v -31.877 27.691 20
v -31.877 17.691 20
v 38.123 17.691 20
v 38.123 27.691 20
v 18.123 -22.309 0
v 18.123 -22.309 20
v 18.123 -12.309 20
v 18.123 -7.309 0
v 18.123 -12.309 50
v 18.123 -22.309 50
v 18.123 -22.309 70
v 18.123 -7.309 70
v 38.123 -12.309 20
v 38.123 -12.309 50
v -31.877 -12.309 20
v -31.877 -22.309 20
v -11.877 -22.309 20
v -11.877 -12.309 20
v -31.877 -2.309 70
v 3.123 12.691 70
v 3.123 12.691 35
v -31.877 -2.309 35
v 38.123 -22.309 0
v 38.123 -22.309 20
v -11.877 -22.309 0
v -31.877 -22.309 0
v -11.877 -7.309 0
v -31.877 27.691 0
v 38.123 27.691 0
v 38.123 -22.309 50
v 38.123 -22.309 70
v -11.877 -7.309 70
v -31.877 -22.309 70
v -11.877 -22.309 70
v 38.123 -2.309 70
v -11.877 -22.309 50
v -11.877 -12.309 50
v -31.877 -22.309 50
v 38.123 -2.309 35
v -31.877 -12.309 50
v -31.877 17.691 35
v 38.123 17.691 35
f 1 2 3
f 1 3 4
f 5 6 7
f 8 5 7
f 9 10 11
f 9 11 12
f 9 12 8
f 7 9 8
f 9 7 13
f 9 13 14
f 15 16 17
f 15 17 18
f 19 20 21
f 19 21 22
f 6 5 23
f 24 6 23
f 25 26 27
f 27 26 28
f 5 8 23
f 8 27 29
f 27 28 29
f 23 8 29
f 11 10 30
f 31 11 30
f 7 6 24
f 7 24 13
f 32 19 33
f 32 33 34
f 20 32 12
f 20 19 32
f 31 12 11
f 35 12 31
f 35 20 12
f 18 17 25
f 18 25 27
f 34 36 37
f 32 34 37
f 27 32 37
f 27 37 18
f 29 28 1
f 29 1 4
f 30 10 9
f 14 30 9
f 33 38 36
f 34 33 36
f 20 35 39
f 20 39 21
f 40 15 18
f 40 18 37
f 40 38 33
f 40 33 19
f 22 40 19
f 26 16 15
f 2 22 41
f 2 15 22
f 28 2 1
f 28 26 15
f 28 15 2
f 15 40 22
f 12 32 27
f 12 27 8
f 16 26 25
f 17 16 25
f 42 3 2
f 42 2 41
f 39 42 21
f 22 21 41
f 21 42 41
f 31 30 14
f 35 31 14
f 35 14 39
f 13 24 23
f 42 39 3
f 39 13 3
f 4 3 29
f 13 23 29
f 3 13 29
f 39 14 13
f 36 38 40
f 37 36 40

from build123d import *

# Parameters (mm, degrees)
IZIM1_W                     = 70
IZIM1_H                     = 50
Y_KSEKLIK_EKSTR_ZYON2_DEPTH = 70
IZIM2_W                     = 30
IZIM2_H                     = 10
KES_EKSTR_ZYON1_DEPTH       = 70
IZIM7_W                     = 30
IZIM7_H                     = 15
KES_EKSTR_ZYON3_DEPTH       = 70
KES_EKSTR_ZYON4_DEPTH       = 35
IZIM9_W                     = 15
IZIM9_H                     = 10
KES_EKSTR_ZYON5_DEPTH       = 70


with BuildPart() as part:
    # Çizim1 → Yükseklik-Ekstrüzyon2 (new body)
    with BuildSketch(Plane.XY):
        with Locations((3.122705421, 2.690839695)):
            Rectangle(IZIM1_W, IZIM1_H)
    extrude(amount=Y_KSEKLIK_EKSTR_ZYON2_DEPTH)

    # Çizim2 → Kes-Ekstrüzyon1 (cut)
    with BuildSketch(Plane.ZY.offset(31.877294579)):
        with Locations((35, -17.309160305)):
            Rectangle(IZIM2_W, IZIM2_H)
    extrude(amount=-KES_EKSTR_ZYON1_DEPTH, mode=Mode.SUBTRACT)

    # Çizim7 → Kes-Ekstrüzyon3 (cut)
    with BuildSketch(Plane.XY.offset(70)):
        with Locations((3.122705421, -14.809160305)):
            Rectangle(IZIM7_W, IZIM7_H)
    extrude(amount=-KES_EKSTR_ZYON3_DEPTH, mode=Mode.SUBTRACT)

    # Çizim8 → Kes-Ekstrüzyon4 (cut)
    with BuildSketch(Plane.XY.offset(70)):
        Polygon((38.122705421, -2.309160305), (3.122705421, 12.690839695), (-31.877294579, -2.309160305), (-31.877294579, 27.690839695), (38.122705421, 27.690839695), align=None)
    extrude(amount=-KES_EKSTR_ZYON4_DEPTH, mode=Mode.SUBTRACT)

    # Çizim9 → Kes-Ekstrüzyon5 (cut)
    with BuildSketch(Plane.ZY.offset(31.877294579)):
        with Locations((27.5, 22.690839695)):
            Rectangle(IZIM9_W, IZIM9_H)
    extrude(amount=-KES_EKSTR_ZYON5_DEPTH, mode=Mode.SUBTRACT)


solid = part.part
